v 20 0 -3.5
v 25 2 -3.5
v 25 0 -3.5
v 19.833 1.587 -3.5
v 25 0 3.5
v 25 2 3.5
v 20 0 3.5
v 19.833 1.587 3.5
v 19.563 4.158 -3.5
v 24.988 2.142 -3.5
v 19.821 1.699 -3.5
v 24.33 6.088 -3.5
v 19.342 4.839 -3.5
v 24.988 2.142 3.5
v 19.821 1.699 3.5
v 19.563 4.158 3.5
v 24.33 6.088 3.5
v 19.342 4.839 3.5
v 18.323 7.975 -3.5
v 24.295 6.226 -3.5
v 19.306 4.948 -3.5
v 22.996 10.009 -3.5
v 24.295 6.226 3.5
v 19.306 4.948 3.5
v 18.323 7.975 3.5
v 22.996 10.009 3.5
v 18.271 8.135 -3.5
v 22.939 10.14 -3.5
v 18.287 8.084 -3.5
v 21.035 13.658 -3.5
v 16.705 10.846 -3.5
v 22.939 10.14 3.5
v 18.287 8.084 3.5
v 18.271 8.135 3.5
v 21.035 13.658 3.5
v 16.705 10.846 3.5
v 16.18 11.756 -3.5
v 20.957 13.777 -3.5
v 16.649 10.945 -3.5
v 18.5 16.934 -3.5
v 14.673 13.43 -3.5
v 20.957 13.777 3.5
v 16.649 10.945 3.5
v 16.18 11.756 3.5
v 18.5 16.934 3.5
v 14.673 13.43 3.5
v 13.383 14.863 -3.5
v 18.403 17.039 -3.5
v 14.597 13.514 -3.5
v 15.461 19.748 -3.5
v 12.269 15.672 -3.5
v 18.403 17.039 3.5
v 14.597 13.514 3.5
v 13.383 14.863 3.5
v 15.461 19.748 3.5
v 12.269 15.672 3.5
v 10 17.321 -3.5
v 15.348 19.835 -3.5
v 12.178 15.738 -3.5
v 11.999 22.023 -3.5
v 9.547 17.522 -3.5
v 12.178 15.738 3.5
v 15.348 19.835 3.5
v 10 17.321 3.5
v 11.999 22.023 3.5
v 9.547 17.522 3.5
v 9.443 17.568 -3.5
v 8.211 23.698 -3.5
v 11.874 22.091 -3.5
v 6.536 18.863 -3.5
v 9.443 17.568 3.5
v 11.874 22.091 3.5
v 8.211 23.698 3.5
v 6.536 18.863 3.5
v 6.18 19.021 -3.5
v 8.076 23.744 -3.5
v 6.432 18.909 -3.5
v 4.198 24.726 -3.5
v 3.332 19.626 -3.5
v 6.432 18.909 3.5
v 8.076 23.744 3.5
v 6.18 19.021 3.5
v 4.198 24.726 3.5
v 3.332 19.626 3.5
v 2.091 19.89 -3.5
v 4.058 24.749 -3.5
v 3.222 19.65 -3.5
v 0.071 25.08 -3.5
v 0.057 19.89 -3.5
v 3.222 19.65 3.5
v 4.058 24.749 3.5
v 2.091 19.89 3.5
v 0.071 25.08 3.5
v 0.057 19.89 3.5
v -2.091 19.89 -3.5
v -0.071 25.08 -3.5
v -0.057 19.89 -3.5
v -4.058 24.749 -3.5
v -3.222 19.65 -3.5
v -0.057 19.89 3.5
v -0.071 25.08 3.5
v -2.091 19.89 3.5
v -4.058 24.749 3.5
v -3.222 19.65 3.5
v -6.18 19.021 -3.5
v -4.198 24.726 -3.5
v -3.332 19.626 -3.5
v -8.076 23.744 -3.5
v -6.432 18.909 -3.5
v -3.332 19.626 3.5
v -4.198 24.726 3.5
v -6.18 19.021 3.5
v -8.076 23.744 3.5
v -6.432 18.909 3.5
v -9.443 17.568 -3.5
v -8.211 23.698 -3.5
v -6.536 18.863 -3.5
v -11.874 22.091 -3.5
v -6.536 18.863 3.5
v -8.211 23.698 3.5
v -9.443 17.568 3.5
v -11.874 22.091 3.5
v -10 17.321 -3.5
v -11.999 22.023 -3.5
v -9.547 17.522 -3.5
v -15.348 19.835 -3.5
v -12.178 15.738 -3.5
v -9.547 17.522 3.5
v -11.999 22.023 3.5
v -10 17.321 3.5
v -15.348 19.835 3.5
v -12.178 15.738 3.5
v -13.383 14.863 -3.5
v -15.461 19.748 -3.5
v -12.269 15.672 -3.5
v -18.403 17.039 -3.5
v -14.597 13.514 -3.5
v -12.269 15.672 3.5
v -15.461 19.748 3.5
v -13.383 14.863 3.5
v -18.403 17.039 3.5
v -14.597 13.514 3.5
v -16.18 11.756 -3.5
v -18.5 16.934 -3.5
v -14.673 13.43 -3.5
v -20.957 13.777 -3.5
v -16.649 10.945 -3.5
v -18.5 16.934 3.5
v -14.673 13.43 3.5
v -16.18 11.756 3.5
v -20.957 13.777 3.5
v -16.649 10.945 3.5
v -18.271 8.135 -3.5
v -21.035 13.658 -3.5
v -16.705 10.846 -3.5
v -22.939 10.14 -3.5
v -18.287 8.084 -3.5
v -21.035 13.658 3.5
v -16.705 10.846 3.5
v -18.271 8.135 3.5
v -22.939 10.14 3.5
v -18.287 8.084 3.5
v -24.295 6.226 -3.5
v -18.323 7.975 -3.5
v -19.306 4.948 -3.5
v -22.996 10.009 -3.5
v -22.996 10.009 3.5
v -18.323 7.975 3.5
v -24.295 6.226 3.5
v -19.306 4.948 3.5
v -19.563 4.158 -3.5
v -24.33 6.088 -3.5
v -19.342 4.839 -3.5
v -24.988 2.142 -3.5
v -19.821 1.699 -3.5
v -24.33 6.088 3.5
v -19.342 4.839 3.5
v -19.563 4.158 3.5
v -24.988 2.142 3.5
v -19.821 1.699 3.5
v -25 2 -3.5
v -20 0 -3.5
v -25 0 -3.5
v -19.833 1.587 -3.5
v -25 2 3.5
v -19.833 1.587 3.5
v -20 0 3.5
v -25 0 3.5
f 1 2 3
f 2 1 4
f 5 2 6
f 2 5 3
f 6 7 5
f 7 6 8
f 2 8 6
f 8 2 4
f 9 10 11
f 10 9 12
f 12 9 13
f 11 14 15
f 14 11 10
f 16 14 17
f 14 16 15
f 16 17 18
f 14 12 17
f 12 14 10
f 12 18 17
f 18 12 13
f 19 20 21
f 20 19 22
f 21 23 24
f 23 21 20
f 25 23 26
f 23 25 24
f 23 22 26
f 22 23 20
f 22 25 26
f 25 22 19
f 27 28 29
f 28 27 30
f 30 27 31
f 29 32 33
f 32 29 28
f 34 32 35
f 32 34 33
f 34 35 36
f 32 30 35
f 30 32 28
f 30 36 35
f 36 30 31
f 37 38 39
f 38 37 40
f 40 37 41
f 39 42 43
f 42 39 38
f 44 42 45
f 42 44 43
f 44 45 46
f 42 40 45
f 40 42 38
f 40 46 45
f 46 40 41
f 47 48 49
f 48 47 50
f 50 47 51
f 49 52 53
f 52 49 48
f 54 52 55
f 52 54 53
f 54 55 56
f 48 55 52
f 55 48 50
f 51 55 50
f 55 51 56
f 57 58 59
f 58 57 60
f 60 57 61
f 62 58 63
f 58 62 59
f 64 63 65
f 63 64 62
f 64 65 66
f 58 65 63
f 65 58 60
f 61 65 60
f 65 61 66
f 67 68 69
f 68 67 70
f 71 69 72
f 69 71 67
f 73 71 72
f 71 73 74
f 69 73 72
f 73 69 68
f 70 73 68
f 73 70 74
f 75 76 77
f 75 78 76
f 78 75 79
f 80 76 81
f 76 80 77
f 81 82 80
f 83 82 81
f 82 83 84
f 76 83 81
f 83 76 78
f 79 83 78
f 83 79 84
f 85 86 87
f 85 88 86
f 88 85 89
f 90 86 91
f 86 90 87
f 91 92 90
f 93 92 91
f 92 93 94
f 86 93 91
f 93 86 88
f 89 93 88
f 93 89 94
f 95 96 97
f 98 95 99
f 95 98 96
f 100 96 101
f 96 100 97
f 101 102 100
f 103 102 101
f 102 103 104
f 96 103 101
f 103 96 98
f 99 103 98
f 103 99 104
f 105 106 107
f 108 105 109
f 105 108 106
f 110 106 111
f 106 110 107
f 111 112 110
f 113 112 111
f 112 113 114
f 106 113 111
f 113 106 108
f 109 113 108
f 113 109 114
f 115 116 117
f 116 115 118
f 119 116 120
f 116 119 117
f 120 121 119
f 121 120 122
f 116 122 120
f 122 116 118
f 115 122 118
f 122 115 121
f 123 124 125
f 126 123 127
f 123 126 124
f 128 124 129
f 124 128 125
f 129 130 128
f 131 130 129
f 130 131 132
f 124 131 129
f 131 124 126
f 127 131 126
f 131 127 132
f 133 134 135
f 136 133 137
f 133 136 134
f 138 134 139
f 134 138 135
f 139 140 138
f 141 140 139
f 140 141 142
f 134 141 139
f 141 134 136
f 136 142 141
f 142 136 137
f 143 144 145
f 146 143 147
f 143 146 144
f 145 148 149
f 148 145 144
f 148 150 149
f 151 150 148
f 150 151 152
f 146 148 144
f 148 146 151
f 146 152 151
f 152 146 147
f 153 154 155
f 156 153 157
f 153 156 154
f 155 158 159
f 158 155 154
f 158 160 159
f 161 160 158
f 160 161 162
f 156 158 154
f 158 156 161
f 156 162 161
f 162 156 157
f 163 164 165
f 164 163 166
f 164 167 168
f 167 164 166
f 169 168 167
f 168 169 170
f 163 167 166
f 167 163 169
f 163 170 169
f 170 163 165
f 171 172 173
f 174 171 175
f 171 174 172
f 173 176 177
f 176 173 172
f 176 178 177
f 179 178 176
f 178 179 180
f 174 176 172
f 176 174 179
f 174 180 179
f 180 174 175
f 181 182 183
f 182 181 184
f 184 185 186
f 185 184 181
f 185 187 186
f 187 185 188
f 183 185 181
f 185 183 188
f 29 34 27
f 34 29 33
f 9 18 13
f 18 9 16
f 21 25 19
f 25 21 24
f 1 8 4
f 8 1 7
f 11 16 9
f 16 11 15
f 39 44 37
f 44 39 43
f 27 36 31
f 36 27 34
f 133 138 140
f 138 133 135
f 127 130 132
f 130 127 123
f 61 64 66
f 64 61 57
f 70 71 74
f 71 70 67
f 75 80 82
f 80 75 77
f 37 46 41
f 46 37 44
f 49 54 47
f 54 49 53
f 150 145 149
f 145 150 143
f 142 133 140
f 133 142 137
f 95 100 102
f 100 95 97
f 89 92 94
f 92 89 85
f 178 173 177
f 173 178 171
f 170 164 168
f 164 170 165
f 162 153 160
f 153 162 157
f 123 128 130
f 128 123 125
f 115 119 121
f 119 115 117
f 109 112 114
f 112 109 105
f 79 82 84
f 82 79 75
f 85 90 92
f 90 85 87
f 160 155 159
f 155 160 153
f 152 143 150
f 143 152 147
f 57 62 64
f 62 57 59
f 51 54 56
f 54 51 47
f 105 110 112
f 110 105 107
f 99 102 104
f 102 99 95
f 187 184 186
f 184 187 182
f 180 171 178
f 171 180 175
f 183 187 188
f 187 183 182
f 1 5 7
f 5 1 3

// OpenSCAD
module Arc_01(){

    module Cylinder_Wheel(){    // Create Cylinder Sectors
        color("#a8b0b2")

        for (i=[0:45:359]) {
            r = 10; // pattern radius
            n = 38; // number of 
            step = 360/n;
            for (i=[0:step:359]) {
                angle = i;
                dx = r*cos(angle);
                dy = r*sin(angle);
                rotate([0,0,angle])  
                {    
                linear_extrude(7, scale = 1,center = true)
                polygon(points=[[0,0],[25,-2],[25,2]]);
                }     
            }
        }
    }
    
    color("#f2e8d7"){
    difference(){           // Subtract Cylinders to obtain arc
        Cylinder_Wheel();  
        cylinder(50,20,20, center= true);    
        translate([0,-25,0])
        cube([55,50,100], center = true);
        }
    }

}

Arc_01();



// Written by Nicolì Angelo (Gengio) 2024: 
// MIT License


//Permission is hereby granted, free of charge, to any person obtaining a copy of this software and associated documentation files (the "Software"), to deal in the Software without restriction, including without limitation the rights to use, copy, modify, merge, publish, distribute, sublicense, and/or sell copies of the Software, and to permit persons to whom the Software is furnished to do so, subject to the following conditions:

//The above copyright notice and this permission notice shall be included in all copies or substantial portions of the Software.

//THE SOFTWARE IS PROVIDED "AS IS", WITHOUT WARRANTY OF ANY KIND, EXPRESS OR IMPLIED, INCLUDING BUT NOT LIMITED TO THE WARRANTIES OF MERCHANTABILITY, FITNESS FOR A PARTICULAR PURPOSE AND NONINFRINGEMENT. IN NO EVENT SHALL THE AUTHORS OR COPYRIGHT HOLDERS BE LIABLE FOR ANY CLAIM, DAMAGES OR OTHER LIABILITY, WHETHER IN AN ACTION OF CONTRACT, TORT OR OTHERWISE, ARISING FROM, OUT OF OR IN CONNECTION WITH THE SOFTWARE OR THE USE OR OTHER DEALINGS IN THE SOFTWARE.
